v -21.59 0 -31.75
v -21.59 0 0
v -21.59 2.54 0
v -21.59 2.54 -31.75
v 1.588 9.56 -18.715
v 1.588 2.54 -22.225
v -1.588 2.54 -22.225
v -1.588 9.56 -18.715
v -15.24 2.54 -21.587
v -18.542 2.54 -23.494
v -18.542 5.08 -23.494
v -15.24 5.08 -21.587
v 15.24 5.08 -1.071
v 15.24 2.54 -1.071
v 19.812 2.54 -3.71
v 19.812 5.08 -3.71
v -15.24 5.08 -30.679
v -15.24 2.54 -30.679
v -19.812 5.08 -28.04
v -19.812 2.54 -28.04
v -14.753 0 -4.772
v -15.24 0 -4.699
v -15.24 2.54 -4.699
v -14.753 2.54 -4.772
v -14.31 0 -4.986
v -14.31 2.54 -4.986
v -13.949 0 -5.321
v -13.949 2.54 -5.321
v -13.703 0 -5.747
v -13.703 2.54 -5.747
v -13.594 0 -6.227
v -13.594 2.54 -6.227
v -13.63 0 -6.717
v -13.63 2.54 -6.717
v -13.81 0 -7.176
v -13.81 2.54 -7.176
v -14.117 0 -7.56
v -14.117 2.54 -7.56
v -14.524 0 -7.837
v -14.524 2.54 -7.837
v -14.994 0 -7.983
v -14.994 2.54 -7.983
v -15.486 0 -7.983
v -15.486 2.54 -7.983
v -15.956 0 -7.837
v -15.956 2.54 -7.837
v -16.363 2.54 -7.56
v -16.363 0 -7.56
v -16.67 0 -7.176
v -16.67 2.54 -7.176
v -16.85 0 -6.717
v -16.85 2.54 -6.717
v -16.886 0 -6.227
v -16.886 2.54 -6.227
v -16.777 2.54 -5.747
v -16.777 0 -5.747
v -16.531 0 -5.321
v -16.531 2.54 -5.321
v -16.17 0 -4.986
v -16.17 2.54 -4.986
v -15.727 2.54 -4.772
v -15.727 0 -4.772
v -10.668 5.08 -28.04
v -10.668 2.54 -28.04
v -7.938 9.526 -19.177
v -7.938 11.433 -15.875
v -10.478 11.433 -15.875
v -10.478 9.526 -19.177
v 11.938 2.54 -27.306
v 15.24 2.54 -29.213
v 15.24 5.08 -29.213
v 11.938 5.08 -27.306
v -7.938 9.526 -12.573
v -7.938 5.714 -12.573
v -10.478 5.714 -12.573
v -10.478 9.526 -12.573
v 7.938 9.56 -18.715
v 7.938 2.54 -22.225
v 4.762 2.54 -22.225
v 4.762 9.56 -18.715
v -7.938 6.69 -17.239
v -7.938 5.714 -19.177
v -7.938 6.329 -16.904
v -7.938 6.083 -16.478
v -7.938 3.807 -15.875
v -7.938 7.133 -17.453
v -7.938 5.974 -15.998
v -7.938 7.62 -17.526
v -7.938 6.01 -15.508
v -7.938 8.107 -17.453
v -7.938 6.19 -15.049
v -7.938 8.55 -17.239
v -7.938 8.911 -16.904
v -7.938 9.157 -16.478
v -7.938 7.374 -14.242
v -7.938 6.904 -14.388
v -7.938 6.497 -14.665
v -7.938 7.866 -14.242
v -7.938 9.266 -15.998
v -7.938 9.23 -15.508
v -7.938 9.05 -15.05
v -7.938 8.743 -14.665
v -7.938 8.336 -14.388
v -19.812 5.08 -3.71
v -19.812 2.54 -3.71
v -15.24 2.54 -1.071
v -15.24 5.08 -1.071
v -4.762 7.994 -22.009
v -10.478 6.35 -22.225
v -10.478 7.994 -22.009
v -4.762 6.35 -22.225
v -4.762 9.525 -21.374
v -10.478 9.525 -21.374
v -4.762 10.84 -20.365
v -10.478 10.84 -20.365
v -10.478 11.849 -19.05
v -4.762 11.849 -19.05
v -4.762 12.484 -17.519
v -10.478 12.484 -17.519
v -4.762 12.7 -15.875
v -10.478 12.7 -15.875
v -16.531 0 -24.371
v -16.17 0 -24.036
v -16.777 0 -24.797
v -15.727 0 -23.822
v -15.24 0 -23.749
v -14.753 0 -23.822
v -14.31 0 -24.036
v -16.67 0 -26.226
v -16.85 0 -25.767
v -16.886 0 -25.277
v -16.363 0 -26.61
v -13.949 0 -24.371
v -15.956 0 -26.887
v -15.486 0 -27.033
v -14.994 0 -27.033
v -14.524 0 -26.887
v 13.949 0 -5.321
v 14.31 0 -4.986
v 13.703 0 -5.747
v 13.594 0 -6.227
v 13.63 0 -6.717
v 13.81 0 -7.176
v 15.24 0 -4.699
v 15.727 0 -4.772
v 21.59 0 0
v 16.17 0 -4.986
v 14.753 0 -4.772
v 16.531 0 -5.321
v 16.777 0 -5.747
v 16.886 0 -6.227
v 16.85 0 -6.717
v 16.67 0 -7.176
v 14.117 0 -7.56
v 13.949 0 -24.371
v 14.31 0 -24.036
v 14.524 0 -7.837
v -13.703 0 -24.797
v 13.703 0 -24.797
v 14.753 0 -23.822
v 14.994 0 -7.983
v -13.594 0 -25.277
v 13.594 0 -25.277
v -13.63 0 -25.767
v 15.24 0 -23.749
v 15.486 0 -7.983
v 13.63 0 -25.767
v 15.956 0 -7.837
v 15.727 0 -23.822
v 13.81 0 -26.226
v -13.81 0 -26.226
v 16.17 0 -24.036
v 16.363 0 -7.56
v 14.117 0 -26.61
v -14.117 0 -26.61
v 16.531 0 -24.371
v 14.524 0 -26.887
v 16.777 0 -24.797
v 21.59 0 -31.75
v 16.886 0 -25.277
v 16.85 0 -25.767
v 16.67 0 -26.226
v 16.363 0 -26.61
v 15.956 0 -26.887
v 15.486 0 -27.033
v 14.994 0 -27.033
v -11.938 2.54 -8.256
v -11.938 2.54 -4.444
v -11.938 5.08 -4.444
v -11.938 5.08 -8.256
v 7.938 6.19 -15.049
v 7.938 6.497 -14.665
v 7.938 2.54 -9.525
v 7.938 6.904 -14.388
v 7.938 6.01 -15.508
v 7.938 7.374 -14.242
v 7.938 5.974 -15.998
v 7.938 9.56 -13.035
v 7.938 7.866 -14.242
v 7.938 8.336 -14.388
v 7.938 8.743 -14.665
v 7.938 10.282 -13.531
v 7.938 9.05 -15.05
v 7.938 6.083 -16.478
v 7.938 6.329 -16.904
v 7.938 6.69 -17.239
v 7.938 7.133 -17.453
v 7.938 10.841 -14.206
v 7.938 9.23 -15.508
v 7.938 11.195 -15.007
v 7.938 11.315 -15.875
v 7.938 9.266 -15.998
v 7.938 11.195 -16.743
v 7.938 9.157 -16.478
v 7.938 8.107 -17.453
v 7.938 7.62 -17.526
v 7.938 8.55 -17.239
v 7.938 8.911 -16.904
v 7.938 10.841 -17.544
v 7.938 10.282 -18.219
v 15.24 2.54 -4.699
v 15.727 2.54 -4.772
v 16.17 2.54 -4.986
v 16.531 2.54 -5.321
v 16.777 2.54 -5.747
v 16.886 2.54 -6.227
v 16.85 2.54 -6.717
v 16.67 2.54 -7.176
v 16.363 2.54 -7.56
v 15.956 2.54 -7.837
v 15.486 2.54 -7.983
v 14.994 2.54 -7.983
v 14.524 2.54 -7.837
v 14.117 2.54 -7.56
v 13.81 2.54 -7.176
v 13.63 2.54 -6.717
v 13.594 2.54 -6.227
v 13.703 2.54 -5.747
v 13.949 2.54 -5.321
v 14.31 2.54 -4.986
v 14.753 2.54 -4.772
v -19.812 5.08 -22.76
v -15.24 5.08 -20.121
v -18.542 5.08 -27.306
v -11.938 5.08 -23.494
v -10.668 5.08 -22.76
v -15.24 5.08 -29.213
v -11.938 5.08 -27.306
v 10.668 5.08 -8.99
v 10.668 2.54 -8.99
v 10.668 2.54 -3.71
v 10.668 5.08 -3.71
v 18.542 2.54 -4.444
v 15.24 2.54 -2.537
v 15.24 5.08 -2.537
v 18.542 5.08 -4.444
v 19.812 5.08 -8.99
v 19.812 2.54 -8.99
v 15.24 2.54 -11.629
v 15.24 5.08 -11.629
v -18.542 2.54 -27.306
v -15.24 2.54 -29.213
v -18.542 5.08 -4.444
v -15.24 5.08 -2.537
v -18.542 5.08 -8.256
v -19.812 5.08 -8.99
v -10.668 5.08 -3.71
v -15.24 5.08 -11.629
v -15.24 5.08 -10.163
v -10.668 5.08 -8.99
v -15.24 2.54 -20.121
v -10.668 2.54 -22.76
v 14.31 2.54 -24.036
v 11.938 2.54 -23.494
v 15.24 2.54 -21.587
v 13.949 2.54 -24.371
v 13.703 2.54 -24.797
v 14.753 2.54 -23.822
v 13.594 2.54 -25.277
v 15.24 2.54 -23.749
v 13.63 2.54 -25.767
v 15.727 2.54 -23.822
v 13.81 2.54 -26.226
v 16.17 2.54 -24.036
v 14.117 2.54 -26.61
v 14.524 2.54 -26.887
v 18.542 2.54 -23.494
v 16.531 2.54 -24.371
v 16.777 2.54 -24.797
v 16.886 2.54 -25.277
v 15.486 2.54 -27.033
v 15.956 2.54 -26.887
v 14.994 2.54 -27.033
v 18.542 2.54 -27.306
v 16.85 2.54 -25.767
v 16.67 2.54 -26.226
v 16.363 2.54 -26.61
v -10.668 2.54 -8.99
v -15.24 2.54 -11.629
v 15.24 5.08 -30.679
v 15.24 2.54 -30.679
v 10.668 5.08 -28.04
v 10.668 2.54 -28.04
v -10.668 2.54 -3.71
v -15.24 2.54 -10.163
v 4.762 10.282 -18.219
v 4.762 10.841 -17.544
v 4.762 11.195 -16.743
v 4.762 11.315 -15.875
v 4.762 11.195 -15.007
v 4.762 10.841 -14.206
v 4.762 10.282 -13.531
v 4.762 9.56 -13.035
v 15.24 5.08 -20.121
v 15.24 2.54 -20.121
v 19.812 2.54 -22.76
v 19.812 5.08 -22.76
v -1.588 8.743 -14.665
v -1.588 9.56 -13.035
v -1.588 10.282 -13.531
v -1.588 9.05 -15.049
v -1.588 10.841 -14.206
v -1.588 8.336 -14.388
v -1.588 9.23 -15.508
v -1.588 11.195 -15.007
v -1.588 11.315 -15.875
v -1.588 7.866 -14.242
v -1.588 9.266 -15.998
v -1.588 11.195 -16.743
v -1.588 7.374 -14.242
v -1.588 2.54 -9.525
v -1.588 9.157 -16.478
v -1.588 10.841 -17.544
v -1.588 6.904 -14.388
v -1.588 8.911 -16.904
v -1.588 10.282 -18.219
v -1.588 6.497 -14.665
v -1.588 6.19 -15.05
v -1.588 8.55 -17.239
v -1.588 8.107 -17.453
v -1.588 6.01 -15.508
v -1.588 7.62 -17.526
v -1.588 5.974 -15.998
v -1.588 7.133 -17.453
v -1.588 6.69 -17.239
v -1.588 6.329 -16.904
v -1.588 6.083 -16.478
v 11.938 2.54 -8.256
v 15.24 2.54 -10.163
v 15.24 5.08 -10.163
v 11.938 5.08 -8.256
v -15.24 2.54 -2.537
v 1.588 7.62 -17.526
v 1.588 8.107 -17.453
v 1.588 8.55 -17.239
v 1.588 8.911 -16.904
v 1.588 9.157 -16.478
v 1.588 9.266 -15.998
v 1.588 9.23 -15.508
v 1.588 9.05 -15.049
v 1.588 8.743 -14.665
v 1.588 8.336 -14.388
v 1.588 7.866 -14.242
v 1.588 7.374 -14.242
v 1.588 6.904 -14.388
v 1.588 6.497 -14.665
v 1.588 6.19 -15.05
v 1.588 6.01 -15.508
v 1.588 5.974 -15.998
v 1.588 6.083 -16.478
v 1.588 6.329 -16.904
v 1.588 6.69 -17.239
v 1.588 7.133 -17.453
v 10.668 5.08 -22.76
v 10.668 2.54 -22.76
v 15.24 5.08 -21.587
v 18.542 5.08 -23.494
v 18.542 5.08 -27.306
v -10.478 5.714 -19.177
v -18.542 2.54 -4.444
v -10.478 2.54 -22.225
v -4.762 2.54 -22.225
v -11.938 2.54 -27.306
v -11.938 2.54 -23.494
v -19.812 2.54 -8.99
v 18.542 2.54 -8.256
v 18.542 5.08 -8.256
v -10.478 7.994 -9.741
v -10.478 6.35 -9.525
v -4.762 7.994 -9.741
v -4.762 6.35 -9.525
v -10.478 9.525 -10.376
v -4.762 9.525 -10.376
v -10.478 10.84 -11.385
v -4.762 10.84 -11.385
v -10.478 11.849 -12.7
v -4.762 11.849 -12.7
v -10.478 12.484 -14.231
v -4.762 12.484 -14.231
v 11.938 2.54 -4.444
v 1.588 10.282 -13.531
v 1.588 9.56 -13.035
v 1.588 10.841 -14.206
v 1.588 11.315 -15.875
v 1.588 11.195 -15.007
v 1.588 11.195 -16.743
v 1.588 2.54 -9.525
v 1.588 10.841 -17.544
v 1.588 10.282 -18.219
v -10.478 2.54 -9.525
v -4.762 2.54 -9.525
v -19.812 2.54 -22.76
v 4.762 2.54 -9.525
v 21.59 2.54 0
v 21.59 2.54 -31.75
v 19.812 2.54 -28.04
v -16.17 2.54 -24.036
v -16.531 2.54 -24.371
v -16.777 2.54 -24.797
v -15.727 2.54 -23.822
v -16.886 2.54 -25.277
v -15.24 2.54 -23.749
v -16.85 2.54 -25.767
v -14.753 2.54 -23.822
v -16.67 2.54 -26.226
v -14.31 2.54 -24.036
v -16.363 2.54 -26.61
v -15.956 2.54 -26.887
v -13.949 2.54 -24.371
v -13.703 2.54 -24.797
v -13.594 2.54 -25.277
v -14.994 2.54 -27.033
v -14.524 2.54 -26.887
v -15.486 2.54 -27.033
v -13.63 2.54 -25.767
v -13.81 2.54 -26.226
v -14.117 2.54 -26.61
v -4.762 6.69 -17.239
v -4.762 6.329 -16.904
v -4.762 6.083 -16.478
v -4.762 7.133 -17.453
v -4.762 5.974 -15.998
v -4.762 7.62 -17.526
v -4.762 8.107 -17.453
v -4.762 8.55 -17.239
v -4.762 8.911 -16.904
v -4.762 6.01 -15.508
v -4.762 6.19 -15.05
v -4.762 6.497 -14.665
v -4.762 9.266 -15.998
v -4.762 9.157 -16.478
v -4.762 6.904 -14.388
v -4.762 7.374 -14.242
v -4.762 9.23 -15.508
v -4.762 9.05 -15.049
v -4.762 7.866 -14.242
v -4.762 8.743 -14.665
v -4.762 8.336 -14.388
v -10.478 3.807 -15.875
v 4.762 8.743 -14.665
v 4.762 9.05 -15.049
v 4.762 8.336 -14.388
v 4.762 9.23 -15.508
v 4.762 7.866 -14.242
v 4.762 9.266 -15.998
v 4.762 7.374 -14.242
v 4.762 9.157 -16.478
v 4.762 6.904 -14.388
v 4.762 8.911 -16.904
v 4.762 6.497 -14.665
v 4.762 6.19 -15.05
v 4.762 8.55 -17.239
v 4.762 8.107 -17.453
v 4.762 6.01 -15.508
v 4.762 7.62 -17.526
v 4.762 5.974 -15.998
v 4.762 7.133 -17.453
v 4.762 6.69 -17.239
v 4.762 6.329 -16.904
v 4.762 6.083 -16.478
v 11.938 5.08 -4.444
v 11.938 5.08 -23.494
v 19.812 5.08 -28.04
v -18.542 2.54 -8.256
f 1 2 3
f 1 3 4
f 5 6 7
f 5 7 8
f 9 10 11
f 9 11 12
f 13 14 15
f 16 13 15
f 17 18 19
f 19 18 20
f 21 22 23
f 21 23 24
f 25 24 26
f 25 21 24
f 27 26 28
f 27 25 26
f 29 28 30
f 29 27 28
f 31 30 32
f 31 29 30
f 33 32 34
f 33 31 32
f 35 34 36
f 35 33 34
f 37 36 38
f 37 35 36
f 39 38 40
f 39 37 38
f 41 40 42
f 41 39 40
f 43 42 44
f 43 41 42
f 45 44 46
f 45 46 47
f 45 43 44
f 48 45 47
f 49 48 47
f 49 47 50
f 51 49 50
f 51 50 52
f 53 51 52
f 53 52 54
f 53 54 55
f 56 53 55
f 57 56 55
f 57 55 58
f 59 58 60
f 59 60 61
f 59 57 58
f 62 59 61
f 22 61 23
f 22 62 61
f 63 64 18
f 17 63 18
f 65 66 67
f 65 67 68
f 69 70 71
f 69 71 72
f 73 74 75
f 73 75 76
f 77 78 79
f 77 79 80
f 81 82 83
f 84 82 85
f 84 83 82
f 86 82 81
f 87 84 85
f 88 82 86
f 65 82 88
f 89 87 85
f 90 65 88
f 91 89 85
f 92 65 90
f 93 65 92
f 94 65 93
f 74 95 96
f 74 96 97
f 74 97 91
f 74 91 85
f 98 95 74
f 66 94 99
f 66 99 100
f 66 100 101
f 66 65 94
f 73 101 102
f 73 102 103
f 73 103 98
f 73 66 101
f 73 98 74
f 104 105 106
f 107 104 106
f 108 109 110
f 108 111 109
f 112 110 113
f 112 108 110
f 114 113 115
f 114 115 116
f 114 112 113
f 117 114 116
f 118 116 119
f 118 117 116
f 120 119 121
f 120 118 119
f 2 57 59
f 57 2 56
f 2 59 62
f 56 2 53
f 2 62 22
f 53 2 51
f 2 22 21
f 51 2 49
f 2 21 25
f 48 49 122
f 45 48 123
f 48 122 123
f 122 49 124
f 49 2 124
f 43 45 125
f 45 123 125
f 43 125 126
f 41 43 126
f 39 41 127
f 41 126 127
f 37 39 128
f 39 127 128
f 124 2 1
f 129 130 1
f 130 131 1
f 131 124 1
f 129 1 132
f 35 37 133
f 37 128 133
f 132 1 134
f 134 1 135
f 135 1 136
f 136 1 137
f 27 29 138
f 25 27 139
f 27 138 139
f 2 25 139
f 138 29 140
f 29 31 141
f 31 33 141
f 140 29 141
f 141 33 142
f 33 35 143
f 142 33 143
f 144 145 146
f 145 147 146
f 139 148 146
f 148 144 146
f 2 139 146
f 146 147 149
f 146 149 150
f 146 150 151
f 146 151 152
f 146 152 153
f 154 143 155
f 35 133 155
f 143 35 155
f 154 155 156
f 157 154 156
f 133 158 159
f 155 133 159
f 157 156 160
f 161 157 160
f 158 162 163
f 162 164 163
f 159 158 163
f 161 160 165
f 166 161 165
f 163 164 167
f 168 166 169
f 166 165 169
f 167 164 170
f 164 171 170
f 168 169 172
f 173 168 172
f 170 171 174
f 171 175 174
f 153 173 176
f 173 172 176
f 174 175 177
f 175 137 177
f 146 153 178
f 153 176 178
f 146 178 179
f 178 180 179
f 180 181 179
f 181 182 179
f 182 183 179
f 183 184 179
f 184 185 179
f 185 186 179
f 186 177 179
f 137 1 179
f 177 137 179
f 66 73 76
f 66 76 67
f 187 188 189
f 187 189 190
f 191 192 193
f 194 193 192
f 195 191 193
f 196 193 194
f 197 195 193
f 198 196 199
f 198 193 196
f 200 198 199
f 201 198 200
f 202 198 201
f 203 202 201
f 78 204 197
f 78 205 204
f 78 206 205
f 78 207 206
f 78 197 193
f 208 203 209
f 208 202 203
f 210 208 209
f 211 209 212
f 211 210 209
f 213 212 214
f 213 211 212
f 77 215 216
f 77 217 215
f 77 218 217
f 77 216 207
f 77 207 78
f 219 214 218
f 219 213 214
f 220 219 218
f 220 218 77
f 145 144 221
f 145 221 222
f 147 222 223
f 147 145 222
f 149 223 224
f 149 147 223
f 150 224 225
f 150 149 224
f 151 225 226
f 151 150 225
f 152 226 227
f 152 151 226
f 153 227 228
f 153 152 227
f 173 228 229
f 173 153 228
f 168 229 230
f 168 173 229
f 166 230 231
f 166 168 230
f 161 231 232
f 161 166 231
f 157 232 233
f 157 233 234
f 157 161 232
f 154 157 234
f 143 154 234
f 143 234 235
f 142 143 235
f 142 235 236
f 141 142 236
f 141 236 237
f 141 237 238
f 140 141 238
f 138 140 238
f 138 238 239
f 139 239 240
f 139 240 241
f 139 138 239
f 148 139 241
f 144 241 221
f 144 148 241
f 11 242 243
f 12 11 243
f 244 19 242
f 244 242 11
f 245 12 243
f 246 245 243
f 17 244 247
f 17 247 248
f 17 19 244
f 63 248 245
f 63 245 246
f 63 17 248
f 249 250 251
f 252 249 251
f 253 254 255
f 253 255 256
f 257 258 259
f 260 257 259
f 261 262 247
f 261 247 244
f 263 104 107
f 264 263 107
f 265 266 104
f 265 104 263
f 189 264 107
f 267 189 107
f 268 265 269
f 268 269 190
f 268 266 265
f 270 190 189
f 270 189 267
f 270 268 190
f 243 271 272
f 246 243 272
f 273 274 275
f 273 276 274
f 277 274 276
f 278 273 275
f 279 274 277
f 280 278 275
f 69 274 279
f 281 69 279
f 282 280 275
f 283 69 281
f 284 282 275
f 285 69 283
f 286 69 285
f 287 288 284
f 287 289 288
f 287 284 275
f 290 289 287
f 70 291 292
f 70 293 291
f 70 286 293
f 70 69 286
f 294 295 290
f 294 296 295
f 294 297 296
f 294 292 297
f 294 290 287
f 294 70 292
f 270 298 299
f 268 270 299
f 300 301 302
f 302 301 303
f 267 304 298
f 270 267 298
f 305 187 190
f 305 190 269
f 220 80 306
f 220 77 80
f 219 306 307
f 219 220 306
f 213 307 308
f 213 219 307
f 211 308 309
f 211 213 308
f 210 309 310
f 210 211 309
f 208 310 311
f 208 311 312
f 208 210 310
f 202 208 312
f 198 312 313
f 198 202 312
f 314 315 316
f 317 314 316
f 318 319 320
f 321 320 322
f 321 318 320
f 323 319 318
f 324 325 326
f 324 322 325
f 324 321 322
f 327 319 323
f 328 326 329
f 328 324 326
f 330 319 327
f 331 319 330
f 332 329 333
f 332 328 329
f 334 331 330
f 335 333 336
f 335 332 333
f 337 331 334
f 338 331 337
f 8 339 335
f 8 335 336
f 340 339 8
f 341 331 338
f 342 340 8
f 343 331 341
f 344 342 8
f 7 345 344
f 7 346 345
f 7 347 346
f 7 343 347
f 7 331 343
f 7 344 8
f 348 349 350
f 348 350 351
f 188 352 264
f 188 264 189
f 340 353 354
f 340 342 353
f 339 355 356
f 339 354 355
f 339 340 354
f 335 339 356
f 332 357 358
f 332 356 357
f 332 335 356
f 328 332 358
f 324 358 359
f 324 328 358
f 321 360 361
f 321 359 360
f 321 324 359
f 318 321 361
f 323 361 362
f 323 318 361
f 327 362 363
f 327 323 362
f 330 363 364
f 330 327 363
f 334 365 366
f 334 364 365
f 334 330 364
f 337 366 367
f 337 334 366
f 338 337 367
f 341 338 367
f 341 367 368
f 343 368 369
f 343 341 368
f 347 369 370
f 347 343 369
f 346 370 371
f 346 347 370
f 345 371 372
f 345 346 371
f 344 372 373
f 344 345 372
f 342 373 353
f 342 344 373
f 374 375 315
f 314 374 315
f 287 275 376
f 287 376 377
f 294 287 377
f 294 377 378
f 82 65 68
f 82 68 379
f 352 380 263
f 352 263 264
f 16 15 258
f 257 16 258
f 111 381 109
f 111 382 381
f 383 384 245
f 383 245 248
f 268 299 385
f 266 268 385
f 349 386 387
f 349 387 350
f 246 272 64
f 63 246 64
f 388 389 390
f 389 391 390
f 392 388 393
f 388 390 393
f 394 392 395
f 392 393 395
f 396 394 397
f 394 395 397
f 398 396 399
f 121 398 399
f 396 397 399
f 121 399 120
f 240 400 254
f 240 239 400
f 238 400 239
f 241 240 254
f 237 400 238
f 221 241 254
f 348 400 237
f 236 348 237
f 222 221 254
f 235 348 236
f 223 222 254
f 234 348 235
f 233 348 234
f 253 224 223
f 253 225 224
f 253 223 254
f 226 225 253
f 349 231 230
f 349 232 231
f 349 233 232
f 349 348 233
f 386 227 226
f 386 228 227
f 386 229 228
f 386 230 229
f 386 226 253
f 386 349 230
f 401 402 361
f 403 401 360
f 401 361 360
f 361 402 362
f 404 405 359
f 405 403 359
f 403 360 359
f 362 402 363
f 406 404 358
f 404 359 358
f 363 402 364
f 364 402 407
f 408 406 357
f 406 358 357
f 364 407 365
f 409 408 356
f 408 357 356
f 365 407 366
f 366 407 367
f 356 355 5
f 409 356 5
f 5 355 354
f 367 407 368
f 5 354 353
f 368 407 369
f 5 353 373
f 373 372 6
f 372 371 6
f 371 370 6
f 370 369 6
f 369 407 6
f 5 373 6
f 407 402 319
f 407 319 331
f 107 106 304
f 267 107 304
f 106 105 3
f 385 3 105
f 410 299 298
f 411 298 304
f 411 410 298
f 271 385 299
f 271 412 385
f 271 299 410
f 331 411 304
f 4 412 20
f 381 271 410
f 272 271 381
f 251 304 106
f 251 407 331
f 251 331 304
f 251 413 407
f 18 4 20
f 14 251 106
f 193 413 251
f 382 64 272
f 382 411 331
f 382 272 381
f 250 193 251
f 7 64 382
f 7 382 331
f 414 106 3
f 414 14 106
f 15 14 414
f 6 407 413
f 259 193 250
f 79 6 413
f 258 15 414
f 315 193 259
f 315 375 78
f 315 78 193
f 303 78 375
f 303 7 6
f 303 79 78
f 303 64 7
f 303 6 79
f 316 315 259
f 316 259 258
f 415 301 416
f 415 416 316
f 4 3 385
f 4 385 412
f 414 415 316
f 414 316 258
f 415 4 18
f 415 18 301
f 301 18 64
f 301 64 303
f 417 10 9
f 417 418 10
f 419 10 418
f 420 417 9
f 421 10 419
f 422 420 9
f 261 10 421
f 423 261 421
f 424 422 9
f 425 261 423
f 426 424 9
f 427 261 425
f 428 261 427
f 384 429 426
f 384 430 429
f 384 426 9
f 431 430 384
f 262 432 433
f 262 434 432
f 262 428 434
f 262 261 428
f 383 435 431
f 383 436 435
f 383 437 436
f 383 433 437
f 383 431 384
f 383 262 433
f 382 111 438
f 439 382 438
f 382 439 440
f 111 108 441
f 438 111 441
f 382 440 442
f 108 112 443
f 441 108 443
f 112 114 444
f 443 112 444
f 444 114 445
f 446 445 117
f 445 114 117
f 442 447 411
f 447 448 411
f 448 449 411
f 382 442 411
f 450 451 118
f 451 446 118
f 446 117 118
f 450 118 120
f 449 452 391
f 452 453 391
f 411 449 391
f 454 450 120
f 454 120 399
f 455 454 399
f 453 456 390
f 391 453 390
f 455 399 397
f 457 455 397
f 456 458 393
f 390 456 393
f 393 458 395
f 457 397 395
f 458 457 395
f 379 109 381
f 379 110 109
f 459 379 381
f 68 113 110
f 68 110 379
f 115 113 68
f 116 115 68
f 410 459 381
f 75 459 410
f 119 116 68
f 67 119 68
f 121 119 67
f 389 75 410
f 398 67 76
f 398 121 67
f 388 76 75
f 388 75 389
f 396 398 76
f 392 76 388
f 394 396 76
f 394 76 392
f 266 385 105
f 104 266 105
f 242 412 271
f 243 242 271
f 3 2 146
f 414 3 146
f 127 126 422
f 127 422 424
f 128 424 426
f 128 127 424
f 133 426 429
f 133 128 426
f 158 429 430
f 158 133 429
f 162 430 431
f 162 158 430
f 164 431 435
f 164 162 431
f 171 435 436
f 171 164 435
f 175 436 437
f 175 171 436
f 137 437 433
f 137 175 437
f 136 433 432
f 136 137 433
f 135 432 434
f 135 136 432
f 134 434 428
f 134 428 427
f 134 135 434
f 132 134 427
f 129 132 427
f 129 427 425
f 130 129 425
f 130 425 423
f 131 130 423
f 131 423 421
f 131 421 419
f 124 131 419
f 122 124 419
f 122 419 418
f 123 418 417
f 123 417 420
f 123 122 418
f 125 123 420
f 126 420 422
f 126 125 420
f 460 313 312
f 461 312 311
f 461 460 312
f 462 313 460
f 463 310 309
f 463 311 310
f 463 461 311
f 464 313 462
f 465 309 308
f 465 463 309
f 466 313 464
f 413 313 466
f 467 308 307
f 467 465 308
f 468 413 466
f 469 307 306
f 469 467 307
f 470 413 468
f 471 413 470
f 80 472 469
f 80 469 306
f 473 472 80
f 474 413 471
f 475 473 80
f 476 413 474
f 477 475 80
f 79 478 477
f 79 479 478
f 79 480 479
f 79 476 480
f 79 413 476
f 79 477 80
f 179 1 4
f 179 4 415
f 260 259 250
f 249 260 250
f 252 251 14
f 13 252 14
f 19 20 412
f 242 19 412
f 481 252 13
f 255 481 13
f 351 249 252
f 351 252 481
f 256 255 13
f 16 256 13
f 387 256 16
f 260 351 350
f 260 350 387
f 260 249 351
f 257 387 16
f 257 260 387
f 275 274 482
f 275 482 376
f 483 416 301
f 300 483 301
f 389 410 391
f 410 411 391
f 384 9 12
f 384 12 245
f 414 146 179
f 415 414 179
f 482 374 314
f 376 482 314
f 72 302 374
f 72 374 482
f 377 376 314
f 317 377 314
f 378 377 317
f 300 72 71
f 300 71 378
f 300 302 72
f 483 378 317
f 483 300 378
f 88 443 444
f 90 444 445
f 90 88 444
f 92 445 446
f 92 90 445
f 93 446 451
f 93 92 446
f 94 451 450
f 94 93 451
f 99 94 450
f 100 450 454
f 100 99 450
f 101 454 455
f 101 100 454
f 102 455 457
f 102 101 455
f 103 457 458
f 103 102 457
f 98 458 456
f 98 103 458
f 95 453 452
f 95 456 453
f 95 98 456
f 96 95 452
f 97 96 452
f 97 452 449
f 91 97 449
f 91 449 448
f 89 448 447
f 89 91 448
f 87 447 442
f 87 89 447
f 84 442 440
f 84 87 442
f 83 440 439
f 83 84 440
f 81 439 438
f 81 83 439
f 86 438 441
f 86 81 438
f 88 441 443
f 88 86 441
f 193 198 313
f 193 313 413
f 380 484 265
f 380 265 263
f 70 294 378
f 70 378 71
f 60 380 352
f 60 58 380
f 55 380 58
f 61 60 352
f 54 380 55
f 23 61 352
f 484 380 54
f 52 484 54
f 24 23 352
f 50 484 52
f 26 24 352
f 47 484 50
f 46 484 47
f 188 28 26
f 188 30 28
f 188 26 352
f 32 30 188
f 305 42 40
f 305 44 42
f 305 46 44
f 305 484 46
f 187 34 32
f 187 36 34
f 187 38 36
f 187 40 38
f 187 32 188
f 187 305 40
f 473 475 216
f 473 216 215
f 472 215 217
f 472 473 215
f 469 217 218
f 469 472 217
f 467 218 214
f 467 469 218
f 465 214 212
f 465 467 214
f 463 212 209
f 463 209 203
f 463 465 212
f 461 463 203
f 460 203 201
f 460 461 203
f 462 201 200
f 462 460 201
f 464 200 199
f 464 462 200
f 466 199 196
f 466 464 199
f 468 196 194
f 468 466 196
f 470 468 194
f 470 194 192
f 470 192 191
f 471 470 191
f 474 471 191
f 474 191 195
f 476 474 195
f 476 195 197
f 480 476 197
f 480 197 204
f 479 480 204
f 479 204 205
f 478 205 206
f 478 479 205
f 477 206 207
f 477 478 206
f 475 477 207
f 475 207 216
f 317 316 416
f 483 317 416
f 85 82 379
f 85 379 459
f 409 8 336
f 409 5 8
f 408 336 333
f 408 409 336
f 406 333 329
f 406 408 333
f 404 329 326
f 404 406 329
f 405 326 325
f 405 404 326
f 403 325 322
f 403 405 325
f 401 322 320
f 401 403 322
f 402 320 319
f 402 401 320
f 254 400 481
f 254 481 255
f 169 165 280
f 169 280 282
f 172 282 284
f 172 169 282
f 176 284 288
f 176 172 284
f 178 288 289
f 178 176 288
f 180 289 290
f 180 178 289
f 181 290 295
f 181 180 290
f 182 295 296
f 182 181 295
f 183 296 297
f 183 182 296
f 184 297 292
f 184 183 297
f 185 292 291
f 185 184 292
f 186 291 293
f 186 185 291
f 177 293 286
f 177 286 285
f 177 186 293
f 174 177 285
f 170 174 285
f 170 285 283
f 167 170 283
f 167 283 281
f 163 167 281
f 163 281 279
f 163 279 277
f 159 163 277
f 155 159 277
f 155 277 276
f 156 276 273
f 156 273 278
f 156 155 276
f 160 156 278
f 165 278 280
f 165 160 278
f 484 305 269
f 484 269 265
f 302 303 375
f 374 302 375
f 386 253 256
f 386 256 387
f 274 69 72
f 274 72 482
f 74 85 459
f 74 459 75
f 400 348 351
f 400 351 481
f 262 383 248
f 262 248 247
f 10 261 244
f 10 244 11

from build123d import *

# Parameters (mm, degrees)
SKETCH1_W           = 43.18
SKETCH1_H           = 31.75
SKETCH1_R           = 1.651
BOSS_EXTRUDE1_DEPTH = 2.54
SKETCH2_R           = 1.651
BOSS_EXTRUDE2_DEPTH = 7.9375
SKETCH3_W           = 3.175
SKETCH3_H           = 12.7
CUT_EXTRUDE1_DEPTH  = 12.7
FILLET1_R           = 3.175
SKETCH6_W           = 12.7
SKETCH6_H           = 10.16
SKETCH6_R           = 1.651
BOSS_EXTRUDE5_DEPTH = 3.175
SKETCH4_W           = 12.7
SKETCH4_H           = 10.16
BOSS_EXTRUDE6_DEPTH = 2.54
FILLET2_R           = 6.35
BOSS_EXTRUDE7_DEPTH = 2.54


with BuildPart() as part:
    # Sketch1 → Boss-Extrude1 (new body)
    with BuildSketch(Plane(origin=(0, 0, 0), x_dir=(1, 0, 0), z_dir=(0, 1, 0))):
        with Locations((0, 15.875)):
            Rectangle(SKETCH1_W, SKETCH1_H)
        with Locations(Location((-15.24, 25.4, 0), (0, 0, 270))):
            Circle(SKETCH1_R, mode=Mode.SUBTRACT)
        with Locations(Location((-15.24, 6.35, 0), (0, 0, 270))):
            Circle(SKETCH1_R, mode=Mode.SUBTRACT)
        with Locations(Location((15.24, 25.4, 0), (0, 0, 270))):
            Circle(SKETCH1_R, mode=Mode.SUBTRACT)
        with Locations(Location((15.24, 6.35, 0), (0, 0, 270))):
            Circle(SKETCH1_R, mode=Mode.SUBTRACT)
    extrude(amount=BOSS_EXTRUDE1_DEPTH)

    # Sketch2 → Boss-Extrude2 (add, symmetric)
    with BuildSketch(Plane(origin=(0, 0, 0), x_dir=(0, 0, -1), z_dir=(1, 0, 0))):
        Polygon((22.225, 2.54), (15.875, 15.24), (9.525, 2.54), align=None)
        with Locations((15.875, 7.62)):
            Circle(SKETCH2_R, mode=Mode.SUBTRACT)
    extrude(amount=BOSS_EXTRUDE2_DEPTH, both=True)

    # Sketch3 → Cut-Extrude1 (cut)
    with BuildSketch(Plane(origin=(0, 2.54, 0), x_dir=(1, 0, 0), z_dir=(0, 1, 0))):
        with Locations((-3.175, 15.875)):
            Rectangle(SKETCH3_W, SKETCH3_H)
        with Locations((3.175, 15.875)):
            Rectangle(SKETCH3_W, SKETCH3_H)
    extrude(amount=CUT_EXTRUDE1_DEPTH, mode=Mode.SUBTRACT)

    # Fillet1
    fillet1_edges = [part.edges().sort_by_distance(p)[0] for p in [
        (6.35, 15.24, -15.875),
        (-6.35, 15.24, -15.875),
        (0, 15.24, -15.875),
    ]]
    fillet(fillet1_edges, radius=FILLET1_R)

    # Sketch6 → Boss-Extrude5 (add)
    with BuildSketch(Plane.ZY.offset(7.9375)):
        with Locations((-15.875, 7.62)):
            Rectangle(SKETCH6_W, SKETCH6_H)
        with Locations((-15.875, 7.62)):
            Circle(SKETCH6_R, mode=Mode.SUBTRACT)
    extrude(amount=-BOSS_EXTRUDE5_DEPTH)

    # Sketch4 → Boss-Extrude6 (add)
    with BuildSketch(Plane.ZY.offset(7.9375)):
        with Locations((-15.875, 7.62)):
            Rectangle(SKETCH4_W, SKETCH4_H)
        Polygon((-19.177, 5.713589411), (-15.875, 3.807178822), (-12.573, 5.713589411), (-12.573, 9.526410589), (-15.875, 11.432821178), (-19.177, 9.526410589), align=None, mode=Mode.SUBTRACT)
    extrude(amount=BOSS_EXTRUDE6_DEPTH)

    # Fillet2
    fillet2_edges = [part.edges().sort_by_distance(p)[0] for p in [
        (-7.62, 12.7, -9.525),
        (-7.62, 12.7, -22.225),
    ]]
    fillet(fillet2_edges, radius=FILLET2_R - 0.0001)  # a hair under: the kernel refuses the full size

    # Sketch7 → Boss-Extrude7 (add)
    # profile 1 of 4: a face of its own
    with BuildSketch(Plane(origin=(0, 2.54, 0), x_dir=(1, 0, 0), z_dir=(0, 1, 0))):
        Polygon((-15.24, 30.679290861), (-19.812, 28.039645431), (-19.812, 22.760354569), (-15.24, 20.120709139), (-10.668, 22.760354569), (-10.668, 28.039645431), align=None)
        Polygon((-15.24, 29.212821178), (-18.542, 27.306410589), (-18.542, 23.493589411), (-15.24, 21.587178822), (-11.938, 23.493589411), (-11.938, 27.306410589), align=None, mode=Mode.SUBTRACT)
    # profile 2 of 4: a face of its own
    with BuildSketch(Plane(origin=(0, 2.54, 0), x_dir=(1, 0, 0), z_dir=(0, 1, 0))):
        Polygon((15.24, 30.679290861), (10.668, 28.039645431), (10.668, 22.760354569), (15.24, 20.120709139), (19.812, 22.760354569), (19.812, 28.039645431), align=None)
        Polygon((15.24, 29.212821178), (11.938, 27.306410589), (11.938, 23.493589411), (15.24, 21.587178822), (18.542, 23.493589411), (18.542, 27.306410589), align=None, mode=Mode.SUBTRACT)
    # profile 3 of 4: a face of its own
    with BuildSketch(Plane(origin=(0, 2.54, 0), x_dir=(1, 0, 0), z_dir=(0, 1, 0))):
        Polygon((15.24, 11.629290861), (10.668, 8.989645431), (10.668, 3.710354569), (15.24, 1.070709139), (19.812, 3.710354569), (19.812, 8.989645431), align=None)
        Polygon((15.24, 10.162821178), (11.938, 8.256410589), (11.938, 4.443589411), (15.24, 2.537178822), (18.542, 4.443589411), (18.542, 8.256410589), align=None, mode=Mode.SUBTRACT)
    # profile 4 of 4: a face of its own
    with BuildSketch(Plane(origin=(0, 2.54, 0), x_dir=(1, 0, 0), z_dir=(0, 1, 0))):
        Polygon((-15.24, 11.629290861), (-19.812, 8.989645431), (-19.812, 3.710354569), (-15.24, 1.070709139), (-10.668, 3.710354569), (-10.668, 8.989645431), align=None)
        Polygon((-15.24, 10.162821178), (-18.542, 8.256410589), (-18.542, 4.443589411), (-15.24, 2.537178822), (-11.938, 4.443589411), (-11.938, 8.256410589), align=None, mode=Mode.SUBTRACT)
    extrude(amount=BOSS_EXTRUDE7_DEPTH)


solid = part.part
